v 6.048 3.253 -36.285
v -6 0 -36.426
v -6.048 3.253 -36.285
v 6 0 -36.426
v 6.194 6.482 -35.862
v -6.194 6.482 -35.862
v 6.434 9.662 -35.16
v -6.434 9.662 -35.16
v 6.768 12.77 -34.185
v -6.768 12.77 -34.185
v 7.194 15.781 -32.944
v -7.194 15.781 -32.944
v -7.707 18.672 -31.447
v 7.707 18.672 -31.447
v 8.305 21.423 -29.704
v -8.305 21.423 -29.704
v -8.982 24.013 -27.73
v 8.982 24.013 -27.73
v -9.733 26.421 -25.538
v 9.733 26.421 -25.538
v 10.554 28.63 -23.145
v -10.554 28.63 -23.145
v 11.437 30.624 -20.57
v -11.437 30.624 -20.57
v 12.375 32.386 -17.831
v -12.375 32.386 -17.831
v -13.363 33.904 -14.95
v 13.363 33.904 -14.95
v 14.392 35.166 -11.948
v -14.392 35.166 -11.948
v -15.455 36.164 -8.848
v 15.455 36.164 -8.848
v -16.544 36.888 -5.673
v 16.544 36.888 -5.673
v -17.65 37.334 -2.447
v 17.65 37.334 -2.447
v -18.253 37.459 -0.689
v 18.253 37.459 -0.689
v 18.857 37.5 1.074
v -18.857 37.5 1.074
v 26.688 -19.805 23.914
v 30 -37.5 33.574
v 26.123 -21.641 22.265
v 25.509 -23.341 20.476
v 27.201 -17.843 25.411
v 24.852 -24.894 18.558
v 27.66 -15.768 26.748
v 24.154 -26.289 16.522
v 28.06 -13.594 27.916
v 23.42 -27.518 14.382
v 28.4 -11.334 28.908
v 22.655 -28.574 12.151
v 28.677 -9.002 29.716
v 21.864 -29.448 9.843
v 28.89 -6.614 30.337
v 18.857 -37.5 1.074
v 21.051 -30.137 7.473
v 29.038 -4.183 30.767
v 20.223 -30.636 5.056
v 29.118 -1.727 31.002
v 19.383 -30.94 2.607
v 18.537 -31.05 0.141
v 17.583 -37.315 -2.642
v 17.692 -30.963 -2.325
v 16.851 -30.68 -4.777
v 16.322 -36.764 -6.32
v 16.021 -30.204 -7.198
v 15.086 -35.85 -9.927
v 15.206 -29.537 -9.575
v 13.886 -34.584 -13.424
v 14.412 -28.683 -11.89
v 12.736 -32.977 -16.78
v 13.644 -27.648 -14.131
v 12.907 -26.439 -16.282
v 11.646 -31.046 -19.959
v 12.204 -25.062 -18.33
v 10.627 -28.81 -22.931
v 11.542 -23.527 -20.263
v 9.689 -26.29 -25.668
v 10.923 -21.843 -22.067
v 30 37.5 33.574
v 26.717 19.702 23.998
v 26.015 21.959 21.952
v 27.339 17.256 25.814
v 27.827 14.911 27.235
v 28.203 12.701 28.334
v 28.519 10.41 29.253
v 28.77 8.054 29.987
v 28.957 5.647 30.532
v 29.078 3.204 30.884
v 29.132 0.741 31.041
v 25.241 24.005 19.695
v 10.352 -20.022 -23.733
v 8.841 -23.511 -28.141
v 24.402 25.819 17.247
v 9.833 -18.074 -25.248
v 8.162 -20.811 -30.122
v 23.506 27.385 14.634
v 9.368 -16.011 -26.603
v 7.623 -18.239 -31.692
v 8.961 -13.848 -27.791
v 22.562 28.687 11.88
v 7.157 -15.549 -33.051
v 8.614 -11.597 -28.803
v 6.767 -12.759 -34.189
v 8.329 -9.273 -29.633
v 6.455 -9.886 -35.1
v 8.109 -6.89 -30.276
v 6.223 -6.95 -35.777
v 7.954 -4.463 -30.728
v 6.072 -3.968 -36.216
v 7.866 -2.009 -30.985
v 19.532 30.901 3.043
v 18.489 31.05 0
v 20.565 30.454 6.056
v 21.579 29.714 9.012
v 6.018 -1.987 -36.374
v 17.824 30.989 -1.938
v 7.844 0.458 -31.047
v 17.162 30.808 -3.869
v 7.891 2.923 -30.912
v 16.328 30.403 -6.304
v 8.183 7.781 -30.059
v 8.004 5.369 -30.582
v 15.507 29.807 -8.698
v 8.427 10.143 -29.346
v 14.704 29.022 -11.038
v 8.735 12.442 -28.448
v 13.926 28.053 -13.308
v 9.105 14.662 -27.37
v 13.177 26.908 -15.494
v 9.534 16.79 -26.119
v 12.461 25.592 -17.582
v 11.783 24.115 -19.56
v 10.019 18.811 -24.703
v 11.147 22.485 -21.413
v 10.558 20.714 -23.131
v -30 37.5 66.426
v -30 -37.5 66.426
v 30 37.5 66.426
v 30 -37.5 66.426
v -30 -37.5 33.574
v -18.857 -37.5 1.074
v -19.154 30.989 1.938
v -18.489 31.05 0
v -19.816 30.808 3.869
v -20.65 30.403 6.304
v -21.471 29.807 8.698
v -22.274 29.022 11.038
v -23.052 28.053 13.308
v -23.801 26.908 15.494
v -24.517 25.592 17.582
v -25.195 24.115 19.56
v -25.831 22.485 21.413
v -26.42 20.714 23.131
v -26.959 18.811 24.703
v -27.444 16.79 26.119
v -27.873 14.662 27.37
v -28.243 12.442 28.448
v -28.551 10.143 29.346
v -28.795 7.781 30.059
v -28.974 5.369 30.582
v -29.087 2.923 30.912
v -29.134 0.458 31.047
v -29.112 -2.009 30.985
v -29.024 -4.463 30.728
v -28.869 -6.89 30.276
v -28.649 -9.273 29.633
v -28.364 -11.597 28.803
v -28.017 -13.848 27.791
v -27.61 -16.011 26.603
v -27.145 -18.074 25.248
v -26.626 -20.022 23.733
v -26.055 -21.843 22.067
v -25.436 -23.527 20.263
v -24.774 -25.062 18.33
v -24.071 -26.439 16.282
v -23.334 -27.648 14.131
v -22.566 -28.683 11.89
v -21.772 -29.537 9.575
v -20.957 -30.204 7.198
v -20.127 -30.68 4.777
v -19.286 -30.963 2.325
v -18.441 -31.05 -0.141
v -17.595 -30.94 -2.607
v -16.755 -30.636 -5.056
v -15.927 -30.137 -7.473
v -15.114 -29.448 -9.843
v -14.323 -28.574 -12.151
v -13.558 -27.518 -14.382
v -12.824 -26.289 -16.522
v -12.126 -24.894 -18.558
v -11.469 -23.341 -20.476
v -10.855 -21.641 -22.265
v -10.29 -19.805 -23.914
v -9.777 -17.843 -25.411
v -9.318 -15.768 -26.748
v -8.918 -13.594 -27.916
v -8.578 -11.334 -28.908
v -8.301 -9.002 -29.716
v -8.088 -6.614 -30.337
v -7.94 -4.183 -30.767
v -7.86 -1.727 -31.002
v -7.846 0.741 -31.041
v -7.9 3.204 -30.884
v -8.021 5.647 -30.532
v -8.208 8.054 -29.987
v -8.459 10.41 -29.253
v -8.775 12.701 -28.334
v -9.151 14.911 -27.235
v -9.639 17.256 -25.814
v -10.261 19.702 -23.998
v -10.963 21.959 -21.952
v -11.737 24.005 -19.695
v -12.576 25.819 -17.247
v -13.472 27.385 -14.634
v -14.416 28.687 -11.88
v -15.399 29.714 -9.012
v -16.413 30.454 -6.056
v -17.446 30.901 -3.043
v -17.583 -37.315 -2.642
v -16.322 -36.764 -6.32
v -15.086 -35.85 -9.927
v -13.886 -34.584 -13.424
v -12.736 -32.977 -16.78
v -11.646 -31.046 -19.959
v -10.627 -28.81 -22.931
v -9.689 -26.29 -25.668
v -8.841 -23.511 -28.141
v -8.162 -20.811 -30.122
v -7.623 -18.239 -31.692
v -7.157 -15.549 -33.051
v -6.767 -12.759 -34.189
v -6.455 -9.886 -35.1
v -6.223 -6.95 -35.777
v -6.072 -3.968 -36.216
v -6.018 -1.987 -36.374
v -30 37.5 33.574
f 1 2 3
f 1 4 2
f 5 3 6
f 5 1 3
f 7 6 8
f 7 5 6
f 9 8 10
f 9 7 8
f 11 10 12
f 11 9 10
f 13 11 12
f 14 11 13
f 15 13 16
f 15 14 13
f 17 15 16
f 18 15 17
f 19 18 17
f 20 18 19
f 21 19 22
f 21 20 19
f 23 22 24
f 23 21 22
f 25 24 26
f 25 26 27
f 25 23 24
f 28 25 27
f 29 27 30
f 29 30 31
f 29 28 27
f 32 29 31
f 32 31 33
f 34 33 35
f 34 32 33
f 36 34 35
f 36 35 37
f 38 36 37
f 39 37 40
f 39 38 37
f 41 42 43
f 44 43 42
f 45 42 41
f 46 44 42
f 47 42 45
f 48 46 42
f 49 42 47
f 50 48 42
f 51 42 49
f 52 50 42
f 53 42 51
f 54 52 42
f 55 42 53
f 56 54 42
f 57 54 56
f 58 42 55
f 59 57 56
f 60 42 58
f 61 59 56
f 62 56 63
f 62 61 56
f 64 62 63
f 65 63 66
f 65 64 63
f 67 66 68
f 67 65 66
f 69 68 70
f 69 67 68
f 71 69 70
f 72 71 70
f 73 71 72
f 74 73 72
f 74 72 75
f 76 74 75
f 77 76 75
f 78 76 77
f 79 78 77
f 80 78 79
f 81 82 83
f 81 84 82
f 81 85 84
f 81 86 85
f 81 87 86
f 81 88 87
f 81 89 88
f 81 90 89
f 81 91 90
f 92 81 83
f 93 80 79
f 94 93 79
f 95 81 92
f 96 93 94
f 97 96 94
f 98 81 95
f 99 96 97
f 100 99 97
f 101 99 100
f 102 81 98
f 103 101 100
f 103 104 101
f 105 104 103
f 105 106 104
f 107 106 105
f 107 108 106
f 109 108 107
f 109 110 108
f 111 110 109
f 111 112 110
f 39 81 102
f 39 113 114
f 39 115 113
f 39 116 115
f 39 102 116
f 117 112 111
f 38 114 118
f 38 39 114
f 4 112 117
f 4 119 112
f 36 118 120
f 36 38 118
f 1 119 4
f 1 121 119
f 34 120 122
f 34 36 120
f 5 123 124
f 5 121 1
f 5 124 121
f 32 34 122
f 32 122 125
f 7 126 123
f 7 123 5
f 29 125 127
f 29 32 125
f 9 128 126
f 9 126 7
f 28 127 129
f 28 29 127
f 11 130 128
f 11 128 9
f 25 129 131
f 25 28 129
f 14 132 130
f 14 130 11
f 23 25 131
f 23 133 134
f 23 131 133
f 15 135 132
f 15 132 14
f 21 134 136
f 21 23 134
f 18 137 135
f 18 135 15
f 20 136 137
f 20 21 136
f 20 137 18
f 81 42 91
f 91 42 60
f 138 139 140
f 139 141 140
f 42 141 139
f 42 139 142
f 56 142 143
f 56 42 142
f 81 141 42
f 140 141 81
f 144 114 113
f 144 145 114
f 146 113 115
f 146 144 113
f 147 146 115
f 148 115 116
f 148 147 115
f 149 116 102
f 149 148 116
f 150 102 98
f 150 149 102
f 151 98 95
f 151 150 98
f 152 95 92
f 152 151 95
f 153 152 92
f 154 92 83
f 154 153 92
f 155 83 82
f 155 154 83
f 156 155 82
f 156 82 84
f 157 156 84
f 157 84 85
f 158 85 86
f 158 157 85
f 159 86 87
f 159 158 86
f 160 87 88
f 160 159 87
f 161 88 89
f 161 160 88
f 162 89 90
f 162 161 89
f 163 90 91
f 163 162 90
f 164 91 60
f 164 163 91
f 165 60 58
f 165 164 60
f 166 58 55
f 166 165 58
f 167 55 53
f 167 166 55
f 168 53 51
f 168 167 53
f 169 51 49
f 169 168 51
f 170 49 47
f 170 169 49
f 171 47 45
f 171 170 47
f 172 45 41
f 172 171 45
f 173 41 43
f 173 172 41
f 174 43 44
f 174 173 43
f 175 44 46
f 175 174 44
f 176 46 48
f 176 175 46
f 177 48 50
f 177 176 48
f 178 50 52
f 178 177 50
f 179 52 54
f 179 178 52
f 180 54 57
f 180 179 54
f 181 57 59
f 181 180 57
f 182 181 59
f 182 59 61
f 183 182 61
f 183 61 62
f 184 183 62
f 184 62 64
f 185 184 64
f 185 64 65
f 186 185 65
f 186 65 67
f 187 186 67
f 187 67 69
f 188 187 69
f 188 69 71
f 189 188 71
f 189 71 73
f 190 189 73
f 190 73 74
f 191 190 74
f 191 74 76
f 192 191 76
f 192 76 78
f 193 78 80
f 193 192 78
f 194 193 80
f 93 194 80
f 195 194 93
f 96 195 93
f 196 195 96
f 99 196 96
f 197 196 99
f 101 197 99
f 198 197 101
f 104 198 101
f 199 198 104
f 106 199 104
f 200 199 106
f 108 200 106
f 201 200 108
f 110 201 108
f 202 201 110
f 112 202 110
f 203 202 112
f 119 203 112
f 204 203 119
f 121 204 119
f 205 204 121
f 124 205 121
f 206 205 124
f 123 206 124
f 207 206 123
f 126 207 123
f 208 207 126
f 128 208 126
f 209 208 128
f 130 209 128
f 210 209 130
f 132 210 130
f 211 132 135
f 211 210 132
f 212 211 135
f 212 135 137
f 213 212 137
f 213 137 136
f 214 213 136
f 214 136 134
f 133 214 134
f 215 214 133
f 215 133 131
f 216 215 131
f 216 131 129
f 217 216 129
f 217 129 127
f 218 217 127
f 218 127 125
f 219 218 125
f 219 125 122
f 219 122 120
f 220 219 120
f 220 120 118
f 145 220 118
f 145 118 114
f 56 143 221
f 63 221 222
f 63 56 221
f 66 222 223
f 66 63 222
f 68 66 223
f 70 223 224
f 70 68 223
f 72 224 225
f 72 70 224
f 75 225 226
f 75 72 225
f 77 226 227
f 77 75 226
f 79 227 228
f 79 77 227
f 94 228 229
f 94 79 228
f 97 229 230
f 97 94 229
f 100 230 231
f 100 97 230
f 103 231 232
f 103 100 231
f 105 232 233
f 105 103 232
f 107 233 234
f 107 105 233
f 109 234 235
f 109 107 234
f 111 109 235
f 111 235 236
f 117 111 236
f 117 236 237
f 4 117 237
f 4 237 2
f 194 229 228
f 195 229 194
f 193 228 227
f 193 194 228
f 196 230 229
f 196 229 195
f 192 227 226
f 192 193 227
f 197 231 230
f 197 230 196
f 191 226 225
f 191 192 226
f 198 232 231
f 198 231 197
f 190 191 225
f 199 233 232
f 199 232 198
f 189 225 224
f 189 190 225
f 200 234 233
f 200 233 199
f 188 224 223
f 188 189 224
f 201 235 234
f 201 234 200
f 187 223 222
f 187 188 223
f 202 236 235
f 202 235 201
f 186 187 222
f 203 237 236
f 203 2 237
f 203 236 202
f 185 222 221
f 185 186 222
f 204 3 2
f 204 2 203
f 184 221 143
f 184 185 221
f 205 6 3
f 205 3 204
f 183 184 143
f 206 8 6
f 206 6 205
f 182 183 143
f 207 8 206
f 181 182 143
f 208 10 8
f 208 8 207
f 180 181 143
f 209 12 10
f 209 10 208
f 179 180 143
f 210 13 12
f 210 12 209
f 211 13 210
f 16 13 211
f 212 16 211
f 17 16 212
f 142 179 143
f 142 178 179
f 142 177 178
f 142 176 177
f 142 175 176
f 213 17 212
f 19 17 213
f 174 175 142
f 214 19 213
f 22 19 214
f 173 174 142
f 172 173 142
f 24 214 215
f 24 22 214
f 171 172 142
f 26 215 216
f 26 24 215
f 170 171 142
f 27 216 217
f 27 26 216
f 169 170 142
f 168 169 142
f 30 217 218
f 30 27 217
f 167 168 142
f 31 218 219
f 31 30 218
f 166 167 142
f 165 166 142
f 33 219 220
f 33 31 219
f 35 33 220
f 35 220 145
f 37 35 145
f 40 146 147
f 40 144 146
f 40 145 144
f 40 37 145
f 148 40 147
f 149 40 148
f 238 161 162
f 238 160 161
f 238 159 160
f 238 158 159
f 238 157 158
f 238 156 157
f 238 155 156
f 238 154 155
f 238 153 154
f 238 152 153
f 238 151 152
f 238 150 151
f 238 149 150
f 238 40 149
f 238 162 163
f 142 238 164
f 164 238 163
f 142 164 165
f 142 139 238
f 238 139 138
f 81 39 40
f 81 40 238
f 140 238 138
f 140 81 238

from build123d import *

# Parameters (mm, degrees)
F0_W        = 75
F0_H        = 30
F0_H_2      = 72.8525593877
F0_R        = 31.05
F1_DEPTH    = 30
F2_T1_DEPTH = 438.2716205132
F3_R        = 37.49999


# Not quite as in the source:
# - a fillet or chamfer that OpenCascade refuses, or shapes differently, is made with other operations: its cross-section is extruded or revolved along the edge and cut away or added
# - a fillet or chamfer is up to 0.001 mm smaller than in the source, because OpenCascade refuses the exact size


with BuildPart() as f1:
    # F0 (on Right) → F1 (new body, symmetric)
    with BuildSketch(Plane.YZ):
        with Locations((0, 51.4262796938)):
            Rectangle(F0_W, F0_H)
        Rectangle(F0_W, F0_H_2)
        Circle(F0_R, mode=Mode.SUBTRACT)
    extrude(amount=F1_DEPTH, both=True)

    # F2: chamfer of 70 x 24 on 2 edges, made by hand

    # F2_s2 → F2_t1 (cut)
    with BuildSketch(Plane.XZ.offset(-219.1358102566)):
        Polygon((30, 33.5737203062), (6, -36.4262796938), (30, -36.4262796938), align=None)
        Polygon((-6, -36.4262796938), (-30, 33.5737203062), (-30, -36.4262796938), align=None)
    extrude(amount=F2_T1_DEPTH, mode=Mode.SUBTRACT)

    # F3 (radius 37.5 in the source; OpenCascade refuses exactly that, so slightly less here)
    f3_edges = [f1.edges().sort_by_distance(p)[0] for p in [
        (0, -37.5, -36.42628),
        (0, 37.5, -36.42628),
    ]]
    fillet(f3_edges, radius=F3_R)


solid = f1.part
